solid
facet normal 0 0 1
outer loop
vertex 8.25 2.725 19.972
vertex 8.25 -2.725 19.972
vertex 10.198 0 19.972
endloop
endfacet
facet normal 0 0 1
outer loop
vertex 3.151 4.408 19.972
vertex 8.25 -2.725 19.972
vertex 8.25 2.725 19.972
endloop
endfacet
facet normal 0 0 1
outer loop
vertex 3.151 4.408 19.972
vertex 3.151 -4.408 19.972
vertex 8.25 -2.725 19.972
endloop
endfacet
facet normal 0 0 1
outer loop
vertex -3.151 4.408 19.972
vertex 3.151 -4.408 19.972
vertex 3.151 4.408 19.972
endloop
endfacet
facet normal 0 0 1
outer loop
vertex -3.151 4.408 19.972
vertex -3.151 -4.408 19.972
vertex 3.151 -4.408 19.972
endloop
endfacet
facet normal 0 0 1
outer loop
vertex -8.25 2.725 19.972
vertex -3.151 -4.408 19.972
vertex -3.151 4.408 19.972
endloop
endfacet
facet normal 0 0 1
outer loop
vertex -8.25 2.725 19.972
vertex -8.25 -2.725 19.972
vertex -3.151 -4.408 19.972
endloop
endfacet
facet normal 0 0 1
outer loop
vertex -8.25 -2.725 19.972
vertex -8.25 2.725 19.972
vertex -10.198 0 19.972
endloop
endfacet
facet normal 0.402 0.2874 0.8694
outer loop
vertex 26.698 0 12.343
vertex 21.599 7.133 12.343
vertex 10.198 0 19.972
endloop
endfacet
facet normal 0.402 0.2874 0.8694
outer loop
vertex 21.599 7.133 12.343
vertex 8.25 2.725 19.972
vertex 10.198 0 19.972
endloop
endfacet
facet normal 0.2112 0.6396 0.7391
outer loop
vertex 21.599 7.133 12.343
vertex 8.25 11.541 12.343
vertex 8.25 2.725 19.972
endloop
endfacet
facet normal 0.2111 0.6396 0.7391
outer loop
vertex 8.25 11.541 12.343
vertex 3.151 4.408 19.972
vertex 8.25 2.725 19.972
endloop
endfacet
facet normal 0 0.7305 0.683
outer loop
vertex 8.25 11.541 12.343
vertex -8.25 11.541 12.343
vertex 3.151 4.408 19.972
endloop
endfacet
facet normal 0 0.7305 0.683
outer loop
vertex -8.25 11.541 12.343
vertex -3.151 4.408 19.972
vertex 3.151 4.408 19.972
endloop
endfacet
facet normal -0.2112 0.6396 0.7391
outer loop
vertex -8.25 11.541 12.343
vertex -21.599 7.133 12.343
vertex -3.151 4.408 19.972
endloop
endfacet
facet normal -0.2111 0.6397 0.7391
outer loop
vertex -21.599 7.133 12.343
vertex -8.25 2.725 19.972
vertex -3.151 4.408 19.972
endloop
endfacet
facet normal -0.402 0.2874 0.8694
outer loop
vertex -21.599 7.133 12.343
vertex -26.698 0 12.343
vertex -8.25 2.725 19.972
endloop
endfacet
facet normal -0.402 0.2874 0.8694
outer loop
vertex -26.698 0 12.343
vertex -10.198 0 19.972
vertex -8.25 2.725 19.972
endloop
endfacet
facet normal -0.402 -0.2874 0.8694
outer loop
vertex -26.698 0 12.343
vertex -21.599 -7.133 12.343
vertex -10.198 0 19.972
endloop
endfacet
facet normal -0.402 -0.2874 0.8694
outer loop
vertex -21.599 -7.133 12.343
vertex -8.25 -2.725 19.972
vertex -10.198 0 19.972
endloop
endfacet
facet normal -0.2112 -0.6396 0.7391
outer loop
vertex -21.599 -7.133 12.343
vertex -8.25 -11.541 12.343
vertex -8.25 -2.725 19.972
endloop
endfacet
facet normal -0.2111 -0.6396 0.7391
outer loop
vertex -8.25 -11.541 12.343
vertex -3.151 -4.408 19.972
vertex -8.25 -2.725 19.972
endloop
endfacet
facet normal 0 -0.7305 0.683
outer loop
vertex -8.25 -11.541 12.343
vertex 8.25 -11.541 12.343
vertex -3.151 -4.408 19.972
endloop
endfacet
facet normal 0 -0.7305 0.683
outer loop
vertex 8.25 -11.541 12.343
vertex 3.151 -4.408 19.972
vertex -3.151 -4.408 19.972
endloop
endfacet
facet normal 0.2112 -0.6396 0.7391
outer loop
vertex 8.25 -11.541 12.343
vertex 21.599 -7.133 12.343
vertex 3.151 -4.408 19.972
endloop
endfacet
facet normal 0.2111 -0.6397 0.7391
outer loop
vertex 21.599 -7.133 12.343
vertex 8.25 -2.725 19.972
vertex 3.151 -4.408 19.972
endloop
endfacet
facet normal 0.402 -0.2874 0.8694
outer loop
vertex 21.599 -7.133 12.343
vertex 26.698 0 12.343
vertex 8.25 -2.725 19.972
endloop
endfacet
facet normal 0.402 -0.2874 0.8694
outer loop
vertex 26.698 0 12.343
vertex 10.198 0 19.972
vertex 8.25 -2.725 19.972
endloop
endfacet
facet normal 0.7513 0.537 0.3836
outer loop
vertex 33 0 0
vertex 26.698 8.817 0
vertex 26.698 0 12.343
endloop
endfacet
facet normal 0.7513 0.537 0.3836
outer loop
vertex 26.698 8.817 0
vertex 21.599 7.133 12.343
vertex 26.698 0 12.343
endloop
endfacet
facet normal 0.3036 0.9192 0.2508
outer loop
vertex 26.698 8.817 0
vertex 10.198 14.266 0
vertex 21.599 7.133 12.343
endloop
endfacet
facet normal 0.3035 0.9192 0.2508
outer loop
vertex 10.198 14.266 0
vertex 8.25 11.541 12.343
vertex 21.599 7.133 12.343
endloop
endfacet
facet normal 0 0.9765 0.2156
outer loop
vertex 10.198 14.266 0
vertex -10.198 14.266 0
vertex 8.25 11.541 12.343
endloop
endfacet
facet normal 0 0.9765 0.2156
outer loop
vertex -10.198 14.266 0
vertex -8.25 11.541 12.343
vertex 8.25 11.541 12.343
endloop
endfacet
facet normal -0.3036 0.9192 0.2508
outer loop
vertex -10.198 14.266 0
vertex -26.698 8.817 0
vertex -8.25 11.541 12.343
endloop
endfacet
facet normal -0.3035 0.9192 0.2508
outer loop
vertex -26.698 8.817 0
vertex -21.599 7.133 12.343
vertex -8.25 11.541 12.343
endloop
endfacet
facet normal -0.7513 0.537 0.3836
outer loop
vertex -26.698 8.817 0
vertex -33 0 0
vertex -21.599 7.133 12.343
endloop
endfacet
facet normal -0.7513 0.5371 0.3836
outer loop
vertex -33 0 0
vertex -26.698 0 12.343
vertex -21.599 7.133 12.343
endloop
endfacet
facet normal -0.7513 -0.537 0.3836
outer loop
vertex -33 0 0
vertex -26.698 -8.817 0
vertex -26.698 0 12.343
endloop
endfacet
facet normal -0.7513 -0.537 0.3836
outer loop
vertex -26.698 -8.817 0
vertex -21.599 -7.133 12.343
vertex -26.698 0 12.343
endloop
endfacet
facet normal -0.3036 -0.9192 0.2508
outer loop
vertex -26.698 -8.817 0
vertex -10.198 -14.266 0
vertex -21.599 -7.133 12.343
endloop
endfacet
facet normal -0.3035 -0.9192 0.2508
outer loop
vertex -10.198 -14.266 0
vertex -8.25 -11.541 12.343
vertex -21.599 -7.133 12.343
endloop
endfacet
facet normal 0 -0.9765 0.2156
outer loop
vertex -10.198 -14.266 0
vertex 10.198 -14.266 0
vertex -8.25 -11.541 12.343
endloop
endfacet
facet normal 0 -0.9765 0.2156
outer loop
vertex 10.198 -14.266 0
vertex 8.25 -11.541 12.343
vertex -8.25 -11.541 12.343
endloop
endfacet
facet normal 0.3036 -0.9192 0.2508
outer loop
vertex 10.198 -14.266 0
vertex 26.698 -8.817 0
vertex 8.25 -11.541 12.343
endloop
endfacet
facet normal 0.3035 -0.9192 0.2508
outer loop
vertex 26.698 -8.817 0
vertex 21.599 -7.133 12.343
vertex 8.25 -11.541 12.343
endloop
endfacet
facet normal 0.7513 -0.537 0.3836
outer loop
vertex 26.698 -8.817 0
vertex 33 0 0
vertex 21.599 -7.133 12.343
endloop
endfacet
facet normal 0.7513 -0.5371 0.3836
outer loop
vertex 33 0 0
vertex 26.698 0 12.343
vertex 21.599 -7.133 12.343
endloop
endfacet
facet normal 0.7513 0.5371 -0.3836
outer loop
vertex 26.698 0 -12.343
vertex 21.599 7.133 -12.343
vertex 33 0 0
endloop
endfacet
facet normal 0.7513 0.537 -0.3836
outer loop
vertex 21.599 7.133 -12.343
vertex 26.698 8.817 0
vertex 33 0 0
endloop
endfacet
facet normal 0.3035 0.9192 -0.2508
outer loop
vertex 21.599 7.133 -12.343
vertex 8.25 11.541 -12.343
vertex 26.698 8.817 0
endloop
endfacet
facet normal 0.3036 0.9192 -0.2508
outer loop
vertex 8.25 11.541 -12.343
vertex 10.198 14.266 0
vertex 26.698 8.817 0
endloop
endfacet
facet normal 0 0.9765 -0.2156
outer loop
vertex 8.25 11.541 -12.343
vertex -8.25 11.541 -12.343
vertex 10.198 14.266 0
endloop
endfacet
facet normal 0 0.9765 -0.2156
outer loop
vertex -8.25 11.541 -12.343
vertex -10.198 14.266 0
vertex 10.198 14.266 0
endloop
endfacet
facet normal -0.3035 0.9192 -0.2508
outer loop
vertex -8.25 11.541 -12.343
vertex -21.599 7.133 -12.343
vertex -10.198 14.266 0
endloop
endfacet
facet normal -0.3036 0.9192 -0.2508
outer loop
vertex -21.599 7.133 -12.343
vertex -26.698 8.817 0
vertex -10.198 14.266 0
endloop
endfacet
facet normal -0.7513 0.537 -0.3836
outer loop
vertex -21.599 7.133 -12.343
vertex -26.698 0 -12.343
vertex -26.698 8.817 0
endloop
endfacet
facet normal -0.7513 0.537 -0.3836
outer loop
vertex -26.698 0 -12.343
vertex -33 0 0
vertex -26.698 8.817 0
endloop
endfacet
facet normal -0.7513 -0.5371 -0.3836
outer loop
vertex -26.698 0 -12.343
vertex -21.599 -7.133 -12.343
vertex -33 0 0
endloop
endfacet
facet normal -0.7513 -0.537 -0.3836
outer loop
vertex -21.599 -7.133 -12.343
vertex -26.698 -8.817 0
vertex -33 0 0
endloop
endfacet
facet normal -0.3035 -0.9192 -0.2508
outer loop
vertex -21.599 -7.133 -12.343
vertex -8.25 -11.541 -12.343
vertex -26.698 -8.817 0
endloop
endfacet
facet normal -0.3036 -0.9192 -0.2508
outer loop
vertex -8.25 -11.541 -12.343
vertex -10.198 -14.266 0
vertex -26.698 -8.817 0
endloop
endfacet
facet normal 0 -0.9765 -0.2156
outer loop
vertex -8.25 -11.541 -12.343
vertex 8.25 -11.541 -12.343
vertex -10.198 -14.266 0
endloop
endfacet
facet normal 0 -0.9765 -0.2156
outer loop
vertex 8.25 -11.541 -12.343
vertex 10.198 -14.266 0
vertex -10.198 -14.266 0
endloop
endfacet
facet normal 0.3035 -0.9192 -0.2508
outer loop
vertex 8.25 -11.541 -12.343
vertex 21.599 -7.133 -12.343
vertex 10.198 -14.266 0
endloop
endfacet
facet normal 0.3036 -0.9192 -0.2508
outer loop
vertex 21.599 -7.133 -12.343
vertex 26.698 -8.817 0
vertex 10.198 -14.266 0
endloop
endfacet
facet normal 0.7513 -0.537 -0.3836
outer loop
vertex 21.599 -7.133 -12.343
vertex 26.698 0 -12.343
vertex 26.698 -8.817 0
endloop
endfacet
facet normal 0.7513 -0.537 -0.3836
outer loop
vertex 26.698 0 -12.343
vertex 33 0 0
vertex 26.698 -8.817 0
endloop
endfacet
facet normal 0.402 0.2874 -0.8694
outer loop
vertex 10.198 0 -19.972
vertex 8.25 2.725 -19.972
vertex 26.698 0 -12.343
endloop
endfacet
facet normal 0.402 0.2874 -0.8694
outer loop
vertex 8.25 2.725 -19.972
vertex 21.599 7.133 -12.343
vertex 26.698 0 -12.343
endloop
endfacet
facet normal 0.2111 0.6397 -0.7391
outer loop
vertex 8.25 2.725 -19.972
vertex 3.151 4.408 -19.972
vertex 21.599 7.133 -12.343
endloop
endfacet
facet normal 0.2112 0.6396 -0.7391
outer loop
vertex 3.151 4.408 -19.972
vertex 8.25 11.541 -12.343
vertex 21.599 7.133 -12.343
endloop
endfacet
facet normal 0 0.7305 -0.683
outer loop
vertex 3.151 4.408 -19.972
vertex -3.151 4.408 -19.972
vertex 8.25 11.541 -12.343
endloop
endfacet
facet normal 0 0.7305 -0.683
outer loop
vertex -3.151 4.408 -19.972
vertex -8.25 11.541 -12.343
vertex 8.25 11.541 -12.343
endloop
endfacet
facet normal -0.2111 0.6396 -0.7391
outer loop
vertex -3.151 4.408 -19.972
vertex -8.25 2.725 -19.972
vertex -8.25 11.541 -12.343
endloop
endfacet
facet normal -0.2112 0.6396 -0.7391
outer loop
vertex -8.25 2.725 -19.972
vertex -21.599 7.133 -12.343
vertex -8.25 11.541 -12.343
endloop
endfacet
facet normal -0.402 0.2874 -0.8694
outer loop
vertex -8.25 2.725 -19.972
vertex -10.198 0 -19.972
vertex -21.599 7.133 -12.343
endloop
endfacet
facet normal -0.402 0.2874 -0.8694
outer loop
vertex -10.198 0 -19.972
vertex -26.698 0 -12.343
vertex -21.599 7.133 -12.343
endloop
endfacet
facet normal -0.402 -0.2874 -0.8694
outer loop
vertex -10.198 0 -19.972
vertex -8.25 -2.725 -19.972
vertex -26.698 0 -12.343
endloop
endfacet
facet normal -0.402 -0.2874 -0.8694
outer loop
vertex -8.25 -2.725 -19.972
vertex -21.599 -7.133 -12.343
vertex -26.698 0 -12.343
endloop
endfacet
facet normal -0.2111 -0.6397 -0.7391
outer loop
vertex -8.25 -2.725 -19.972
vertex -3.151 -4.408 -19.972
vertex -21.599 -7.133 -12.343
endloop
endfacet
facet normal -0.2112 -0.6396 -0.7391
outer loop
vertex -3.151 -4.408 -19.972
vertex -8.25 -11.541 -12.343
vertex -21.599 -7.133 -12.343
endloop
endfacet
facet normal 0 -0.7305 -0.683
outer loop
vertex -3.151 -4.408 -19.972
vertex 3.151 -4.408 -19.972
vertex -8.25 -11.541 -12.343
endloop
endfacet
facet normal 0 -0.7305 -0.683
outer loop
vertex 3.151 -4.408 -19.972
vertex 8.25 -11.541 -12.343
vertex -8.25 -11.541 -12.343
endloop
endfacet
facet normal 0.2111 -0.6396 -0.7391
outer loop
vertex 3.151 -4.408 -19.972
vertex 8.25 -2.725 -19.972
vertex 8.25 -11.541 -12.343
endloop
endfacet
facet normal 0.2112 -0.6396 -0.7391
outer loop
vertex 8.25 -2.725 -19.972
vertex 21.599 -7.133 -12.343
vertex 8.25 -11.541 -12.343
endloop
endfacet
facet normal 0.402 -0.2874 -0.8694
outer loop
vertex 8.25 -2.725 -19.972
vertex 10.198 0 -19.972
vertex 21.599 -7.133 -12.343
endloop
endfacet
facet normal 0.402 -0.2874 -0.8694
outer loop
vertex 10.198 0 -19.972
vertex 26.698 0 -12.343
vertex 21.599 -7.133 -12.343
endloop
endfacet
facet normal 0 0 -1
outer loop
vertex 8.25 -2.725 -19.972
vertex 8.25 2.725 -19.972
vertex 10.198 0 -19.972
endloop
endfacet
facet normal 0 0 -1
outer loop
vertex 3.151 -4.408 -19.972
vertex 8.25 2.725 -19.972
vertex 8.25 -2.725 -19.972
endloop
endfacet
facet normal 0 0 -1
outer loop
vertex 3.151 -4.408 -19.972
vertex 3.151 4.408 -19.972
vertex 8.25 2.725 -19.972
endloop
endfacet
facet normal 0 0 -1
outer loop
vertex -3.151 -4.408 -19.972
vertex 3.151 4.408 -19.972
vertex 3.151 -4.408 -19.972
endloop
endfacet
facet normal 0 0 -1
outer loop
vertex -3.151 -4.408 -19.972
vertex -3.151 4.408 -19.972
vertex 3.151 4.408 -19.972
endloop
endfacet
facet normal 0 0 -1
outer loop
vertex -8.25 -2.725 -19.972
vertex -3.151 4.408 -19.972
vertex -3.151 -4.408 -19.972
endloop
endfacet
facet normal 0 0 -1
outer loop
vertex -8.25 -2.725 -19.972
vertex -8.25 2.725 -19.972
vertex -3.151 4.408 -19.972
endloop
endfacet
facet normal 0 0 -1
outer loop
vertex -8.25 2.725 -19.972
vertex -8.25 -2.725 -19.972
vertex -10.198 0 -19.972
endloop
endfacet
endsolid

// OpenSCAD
// Generated by SolidPython 1.0.1 on 2020-07-29 00:46:49


scale(v = [11, 5, 7]) {
	sphere(r = 3);
}
/***********************************************
*********      SolidPython code:      **********
************************************************
 
# import packages: SolidPython
from solid import *
from solid.utils import *
from itertools import chain, combinations, permutations


class Resize:

    def __init__(self, scad_file):
        self.scad_file = scad_file
        #self.scad_file = import_scad(scad_file)
        # cone/cylinder param:
        self.r1 = 0
        self.r2 = 0
        self.h = 0
        # rectangular prism param:
        self.w = 0
        self.l = 0
        # ellipse param:
        self.r = 0

    # import OpenScad code (file name corresponds to shape)


    # classify shape + parameters
    def assign(self, param1, param2, param3):
        if self.scad_file == 'cone.scad':
            self.r1 = param1
            self.r2 = param2
            self.h = param3
        elif self.scad_file == 'cylinder.scad':
            self.r1 = param1
            self.r2 = param2
            self.h = param3
        elif self.scad_file == 'rectangularPrism.scad':
            self.h = param1
            self.l = param2
            self.w = param3
        else:
            self.r = param1
            self.h = param2

    # resize parameters
    def iterate(self):
        x = range(3, 20, 2)
        i = 1
        if self.scad_file == 'cone.scad':
            tempList = list(permutations(x, 2))
            for temp in tempList:
                param1 = temp[0]
                param2 = temp[1]
                filepath = 'produced_scad_files/' + 'cone' + str(param1) + '_' + str(param2) + '_' + '.scad'
                scad_render_to_file(cylinder(h=param1, r1=param2, r2=0), filepath)

        elif self.scad_file == 'cylinder.scad':
            tempList = list(permutations(x, 3))
            for temp in tempList:
                param1 = temp[0]
                param2 = temp[1]
                filepath = 'produced_scad_files/' + 'cylinder' + str(param1) + '_' + str(param2) + '_' + '.scad'
                scad_render_to_file(cylinder(h=param1, r1=param2, r2=param2), filepath)

        elif self.scad_file == 'rectangularPrism.scad':
            tempList = list(permutations(x, 3))
            for temp in tempList:
                param1 = temp[0]
                param2 = temp[1]
                param3 = temp[2]
                filepath = 'produced_scad_files/' + 'rectangularPrism' + str(param1) + '_' + str(param2) + '_' + str(
                    param3) + '.scad'
                scad_render_to_file(cube(size=(param1, param2, param3)), filepath)

        elif self.scad_file == 'ellipse.scad':
            tempList = list(permutations(x, 4))
            for temp in tempList:
                param1 = temp[0]
                param2 = temp[1]
                param3 = temp[2]
                param4 = temp[3]
                filepath = 'produced_scad_files/' + 'ellipse' + str(param1) + '_' + str(param2) + '_' + str(param3) + '_' + str(param4) + '.scad'
                scad_render_to_file(scale([param1, param2, param3])(sphere(r=param4)), filepath)

    def render_to_scadfile(self):
        scad_render_to_file(scad, 'example.scad') 
 
************************************************/
